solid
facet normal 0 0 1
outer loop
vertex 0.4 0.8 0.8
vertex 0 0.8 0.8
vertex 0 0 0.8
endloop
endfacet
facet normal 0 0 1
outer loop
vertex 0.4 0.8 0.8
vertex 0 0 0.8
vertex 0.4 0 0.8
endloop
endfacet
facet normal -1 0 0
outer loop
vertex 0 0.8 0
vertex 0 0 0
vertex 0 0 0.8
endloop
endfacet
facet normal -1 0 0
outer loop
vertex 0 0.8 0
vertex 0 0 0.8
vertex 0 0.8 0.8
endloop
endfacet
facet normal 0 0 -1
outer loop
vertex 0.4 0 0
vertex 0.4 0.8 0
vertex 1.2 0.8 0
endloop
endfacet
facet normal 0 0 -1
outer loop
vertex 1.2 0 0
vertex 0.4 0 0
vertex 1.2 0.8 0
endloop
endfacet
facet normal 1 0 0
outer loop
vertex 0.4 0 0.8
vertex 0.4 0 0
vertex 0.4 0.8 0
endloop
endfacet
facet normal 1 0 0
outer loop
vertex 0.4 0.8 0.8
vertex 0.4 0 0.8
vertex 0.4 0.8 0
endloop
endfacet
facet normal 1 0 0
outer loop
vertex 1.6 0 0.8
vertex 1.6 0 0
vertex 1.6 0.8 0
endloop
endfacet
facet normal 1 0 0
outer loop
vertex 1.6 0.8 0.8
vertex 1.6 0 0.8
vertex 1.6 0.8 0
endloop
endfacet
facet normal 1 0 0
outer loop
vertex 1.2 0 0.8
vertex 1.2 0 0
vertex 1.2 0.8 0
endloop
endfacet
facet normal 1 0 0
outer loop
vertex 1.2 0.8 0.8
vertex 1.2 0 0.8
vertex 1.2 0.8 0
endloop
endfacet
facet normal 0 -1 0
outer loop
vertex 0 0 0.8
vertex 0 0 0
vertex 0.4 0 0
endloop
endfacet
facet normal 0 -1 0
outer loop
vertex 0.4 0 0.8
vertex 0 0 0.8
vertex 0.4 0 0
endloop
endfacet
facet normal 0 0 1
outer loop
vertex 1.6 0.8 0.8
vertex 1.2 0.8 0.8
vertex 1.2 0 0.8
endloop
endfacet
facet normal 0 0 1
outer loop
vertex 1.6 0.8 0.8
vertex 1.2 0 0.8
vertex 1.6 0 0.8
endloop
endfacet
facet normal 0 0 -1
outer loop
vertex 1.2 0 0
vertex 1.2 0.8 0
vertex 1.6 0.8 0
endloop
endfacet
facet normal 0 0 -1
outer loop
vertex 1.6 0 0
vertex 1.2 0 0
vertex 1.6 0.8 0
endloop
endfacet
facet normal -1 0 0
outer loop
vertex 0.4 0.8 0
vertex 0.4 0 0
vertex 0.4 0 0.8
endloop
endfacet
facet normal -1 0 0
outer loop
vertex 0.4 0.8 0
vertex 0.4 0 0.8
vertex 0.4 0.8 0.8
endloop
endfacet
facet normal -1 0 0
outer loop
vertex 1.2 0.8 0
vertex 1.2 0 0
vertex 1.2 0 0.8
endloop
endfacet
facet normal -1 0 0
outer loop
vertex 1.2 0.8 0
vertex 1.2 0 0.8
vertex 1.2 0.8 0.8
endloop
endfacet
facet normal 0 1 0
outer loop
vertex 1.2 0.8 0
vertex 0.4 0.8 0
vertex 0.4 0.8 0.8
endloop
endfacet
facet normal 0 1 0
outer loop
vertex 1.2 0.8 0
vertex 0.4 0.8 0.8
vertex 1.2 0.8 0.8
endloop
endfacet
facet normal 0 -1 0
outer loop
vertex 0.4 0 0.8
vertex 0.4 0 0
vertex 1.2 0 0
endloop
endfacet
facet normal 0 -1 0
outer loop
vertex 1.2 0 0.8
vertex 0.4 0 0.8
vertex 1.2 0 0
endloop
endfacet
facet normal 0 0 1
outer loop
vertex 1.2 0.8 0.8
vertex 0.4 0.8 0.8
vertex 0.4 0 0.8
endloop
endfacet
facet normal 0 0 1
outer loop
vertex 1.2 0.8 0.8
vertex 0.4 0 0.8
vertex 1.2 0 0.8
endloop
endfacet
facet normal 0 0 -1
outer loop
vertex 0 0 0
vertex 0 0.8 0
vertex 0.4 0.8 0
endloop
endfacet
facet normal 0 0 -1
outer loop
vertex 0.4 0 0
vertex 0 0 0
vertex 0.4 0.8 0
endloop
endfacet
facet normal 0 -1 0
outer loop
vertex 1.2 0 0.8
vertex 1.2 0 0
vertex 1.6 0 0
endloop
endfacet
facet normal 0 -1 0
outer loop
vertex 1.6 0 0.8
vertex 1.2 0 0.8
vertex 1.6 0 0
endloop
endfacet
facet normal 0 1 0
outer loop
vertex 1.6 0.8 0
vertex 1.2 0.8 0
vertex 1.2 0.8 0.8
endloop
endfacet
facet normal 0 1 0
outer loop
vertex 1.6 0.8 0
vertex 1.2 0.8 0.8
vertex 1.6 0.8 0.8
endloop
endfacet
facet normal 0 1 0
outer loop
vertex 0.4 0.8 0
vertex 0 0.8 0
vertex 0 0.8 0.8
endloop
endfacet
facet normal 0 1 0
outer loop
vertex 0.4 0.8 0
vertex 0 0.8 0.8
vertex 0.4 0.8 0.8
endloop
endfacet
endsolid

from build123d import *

# Parameters (mm, degrees)
BOX_W        = 0.4
BOX_H        = 0.8
BOX_DEPTH    = 0.8
BOX001_W     = 0.8
BOX001_H     = 0.8
BOX001_DEPTH = 0.8
BOX002_W     = 0.4
BOX002_H     = 0.8
BOX002_DEPTH = 0.8


with BuildPart() as pad001:
    # Box → Box (new body)
    with BuildSketch(Plane.XY):
        with Locations((0.2, 0.4)):
            Rectangle(BOX_W, BOX_H)
    extrude(amount=BOX_DEPTH)


with BuildPart() as corpo:
    # Box001 → Box001 (new body)
    with BuildSketch(Plane(origin=(0.4, 0, 0), x_dir=(1, 0, 0), z_dir=(0, 0, 1))):
        with Locations((0.4, 0.4)):
            Rectangle(BOX001_W, BOX001_H)
    extrude(amount=BOX001_DEPTH)


with BuildPart() as pad002:
    # Box002 → Box002 (new body)
    with BuildSketch(Plane(origin=(1.2, 0, 0), x_dir=(1, 0, 0), z_dir=(0, 0, 1))):
        with Locations((0.2, 0.4)):
            Rectangle(BOX002_W, BOX002_H)
    extrude(amount=BOX002_DEPTH)


solid = Compound([pad001.part, corpo.part, pad002.part])
